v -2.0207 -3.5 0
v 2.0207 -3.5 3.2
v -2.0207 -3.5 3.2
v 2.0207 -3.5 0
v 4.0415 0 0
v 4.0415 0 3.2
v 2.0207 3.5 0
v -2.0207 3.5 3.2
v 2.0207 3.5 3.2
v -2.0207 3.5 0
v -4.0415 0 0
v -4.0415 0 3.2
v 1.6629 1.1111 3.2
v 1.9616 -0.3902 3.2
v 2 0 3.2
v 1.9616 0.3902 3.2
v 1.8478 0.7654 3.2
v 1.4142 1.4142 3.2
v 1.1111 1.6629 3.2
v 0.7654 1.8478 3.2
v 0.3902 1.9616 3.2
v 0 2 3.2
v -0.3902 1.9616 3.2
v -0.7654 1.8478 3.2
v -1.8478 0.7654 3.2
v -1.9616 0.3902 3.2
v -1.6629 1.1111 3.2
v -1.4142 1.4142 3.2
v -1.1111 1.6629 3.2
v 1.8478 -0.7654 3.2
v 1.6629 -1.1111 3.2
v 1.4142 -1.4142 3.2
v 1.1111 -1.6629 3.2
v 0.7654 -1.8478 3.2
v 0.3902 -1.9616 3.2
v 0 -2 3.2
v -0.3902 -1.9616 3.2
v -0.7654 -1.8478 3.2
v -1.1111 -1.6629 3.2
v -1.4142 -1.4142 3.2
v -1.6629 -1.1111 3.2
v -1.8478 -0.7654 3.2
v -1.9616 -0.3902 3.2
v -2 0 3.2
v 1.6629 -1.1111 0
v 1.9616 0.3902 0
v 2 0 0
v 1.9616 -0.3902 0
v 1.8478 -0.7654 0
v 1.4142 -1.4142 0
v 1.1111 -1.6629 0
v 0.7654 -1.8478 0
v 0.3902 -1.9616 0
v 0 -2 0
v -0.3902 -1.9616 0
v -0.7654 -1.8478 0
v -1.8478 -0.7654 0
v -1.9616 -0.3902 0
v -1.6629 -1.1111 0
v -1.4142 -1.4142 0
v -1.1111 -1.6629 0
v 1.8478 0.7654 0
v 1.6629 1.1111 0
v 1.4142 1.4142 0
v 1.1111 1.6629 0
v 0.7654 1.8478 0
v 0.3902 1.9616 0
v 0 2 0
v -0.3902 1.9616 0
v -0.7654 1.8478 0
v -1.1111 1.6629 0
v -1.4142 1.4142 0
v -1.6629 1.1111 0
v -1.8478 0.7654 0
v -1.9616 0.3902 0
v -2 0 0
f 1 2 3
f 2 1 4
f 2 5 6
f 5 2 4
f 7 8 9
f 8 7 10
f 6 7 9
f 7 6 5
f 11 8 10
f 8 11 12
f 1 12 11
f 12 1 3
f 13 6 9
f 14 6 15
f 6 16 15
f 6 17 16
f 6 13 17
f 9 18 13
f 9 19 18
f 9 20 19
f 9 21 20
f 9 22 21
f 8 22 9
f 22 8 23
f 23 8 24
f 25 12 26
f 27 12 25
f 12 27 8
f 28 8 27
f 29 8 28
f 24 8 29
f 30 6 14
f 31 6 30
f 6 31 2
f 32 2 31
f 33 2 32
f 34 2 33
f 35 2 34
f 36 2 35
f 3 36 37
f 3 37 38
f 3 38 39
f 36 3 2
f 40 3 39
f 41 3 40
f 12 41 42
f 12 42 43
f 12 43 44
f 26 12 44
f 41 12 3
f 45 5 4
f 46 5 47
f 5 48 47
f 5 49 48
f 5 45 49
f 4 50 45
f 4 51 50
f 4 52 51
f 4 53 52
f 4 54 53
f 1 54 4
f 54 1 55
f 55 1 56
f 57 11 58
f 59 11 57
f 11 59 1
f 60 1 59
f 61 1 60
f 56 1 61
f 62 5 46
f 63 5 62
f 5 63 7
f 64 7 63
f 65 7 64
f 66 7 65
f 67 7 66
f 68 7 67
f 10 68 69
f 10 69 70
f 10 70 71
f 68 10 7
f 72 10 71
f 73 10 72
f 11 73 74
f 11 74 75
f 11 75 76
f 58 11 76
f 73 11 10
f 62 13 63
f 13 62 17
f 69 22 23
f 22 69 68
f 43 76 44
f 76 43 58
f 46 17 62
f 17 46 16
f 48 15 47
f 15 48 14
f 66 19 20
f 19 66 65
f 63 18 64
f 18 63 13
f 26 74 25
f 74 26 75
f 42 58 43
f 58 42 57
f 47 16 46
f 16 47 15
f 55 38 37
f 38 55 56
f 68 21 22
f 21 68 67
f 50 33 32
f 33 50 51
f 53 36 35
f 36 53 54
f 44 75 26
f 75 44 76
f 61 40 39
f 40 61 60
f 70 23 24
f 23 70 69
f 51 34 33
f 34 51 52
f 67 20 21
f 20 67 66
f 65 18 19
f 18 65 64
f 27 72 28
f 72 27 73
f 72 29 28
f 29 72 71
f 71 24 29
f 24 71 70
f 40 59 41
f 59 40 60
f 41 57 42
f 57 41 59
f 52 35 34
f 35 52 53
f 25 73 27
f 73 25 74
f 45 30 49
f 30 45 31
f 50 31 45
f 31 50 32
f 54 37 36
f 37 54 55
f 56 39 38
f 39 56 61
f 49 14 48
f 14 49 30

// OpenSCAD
// Purchased hardware envelope; no modeled threads, not print.
$fn=32;
difference(){cylinder(d=7/cos(30),h=3.2,$fn=6);translate([0,0,-1])cylinder(d=4,h=5.2);}
